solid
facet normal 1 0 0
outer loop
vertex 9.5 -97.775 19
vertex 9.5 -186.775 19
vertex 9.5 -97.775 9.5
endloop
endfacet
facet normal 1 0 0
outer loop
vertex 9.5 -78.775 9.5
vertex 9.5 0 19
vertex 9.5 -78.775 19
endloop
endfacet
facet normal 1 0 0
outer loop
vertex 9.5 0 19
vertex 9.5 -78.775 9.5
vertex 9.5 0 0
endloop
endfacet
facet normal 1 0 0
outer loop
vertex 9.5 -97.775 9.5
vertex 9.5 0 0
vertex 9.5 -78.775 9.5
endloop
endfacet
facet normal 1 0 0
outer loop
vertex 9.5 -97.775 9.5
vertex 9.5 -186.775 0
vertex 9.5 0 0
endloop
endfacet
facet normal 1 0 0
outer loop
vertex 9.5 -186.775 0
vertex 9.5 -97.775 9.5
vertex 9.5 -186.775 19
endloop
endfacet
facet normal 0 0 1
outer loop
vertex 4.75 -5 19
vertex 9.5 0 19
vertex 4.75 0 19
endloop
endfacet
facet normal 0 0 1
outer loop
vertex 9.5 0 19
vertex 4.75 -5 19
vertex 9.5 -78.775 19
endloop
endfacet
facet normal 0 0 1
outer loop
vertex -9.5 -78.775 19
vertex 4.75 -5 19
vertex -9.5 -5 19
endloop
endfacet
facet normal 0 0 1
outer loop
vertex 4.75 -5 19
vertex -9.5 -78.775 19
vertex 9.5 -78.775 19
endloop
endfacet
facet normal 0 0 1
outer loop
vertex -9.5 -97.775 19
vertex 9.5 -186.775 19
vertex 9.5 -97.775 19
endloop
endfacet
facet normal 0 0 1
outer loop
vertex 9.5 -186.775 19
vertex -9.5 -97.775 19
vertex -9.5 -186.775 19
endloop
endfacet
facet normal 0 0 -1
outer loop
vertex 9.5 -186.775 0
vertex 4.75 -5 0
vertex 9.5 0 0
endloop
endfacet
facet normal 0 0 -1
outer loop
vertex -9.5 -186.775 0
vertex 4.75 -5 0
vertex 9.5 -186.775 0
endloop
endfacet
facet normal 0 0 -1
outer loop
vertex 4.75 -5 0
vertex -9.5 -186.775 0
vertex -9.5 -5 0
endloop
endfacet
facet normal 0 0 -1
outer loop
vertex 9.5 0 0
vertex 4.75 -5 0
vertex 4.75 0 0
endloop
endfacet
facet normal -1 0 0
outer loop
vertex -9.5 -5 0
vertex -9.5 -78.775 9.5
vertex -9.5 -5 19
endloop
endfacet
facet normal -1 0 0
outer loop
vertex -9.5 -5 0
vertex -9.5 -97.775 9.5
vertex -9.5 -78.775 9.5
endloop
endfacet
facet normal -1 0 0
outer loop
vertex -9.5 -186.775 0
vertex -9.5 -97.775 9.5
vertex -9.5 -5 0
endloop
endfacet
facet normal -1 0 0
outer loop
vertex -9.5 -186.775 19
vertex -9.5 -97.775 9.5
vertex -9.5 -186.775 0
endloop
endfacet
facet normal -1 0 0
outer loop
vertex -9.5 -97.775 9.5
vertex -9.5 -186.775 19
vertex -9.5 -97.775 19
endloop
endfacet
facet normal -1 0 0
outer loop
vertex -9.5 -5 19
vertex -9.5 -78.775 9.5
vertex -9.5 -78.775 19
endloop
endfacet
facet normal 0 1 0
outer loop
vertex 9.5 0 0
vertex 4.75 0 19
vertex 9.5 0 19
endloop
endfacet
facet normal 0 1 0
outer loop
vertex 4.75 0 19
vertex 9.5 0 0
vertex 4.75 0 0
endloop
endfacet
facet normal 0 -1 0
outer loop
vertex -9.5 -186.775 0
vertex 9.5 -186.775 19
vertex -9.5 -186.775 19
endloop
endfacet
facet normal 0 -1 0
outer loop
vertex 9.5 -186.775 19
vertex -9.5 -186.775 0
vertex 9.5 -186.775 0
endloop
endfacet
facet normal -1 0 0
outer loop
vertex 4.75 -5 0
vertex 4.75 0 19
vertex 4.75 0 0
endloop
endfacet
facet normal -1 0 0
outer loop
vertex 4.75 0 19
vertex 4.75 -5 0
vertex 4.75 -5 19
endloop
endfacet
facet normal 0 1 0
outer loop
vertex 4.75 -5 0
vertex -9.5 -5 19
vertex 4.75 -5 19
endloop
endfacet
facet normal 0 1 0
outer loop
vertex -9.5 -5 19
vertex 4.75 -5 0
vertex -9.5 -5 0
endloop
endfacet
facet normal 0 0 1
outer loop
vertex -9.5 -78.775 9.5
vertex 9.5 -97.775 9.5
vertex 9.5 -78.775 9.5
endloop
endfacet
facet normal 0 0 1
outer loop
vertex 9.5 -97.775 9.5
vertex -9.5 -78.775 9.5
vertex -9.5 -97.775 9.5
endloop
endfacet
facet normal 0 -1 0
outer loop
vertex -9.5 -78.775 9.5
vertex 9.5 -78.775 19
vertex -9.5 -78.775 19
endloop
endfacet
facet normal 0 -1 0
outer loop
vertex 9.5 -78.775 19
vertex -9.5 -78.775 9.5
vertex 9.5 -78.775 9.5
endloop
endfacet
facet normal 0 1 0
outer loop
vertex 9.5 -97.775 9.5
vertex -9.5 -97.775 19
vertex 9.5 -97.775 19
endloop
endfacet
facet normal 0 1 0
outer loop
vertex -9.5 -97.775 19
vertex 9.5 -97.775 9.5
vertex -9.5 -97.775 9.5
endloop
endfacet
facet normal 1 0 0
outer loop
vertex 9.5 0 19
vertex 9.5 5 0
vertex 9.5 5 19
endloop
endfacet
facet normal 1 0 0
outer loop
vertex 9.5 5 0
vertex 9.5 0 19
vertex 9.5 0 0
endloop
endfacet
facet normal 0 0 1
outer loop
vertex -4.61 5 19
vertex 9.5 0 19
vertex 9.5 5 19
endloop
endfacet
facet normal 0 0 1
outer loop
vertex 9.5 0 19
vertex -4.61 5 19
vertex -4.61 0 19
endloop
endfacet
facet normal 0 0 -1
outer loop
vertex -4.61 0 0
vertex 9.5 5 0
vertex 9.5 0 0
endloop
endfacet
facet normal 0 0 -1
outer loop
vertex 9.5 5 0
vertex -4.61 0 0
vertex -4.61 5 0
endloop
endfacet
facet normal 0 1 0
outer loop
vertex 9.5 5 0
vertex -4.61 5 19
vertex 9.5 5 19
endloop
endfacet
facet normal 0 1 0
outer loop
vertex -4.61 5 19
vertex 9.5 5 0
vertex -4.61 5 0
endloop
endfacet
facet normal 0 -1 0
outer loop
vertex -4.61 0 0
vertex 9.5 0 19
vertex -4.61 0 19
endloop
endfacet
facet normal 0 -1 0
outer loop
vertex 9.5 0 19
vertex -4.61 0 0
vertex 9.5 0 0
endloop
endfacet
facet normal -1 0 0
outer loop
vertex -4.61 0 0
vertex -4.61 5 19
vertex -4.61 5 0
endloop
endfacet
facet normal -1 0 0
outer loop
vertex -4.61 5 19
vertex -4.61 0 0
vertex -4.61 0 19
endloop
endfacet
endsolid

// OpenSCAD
totalLength = 373.55;
thickness = 19;
lockWidth = 5;
lockOffset = 5;
lockWiggleRoom = 0.15;
smallOpeningSize = 19;
largeOpeningSize = 40.5;
smallOpeningOffsetFromEnd = 89;
largeOpeningOffsetFromEnd = 60.5;
printSmallPieceIf1AndLargePieceIf0 = 1;

if(printSmallPieceIf1AndLargePieceIf0 == 1)
{
    translate([thickness/-2,totalLength/-2,0])
    {
        union()
        {
            difference(){
                cube([thickness,totalLength/2,thickness]);  //main body
                translate([(lockWiggleRoom+0.01)*-1,totalLength/2-(lockWidth),-0.005])
                {
                    cube([(3*(thickness/4))+lockWiggleRoom+0.01,lockWidth+lockWiggleRoom,thickness+0.01]);
                }
                translate([-0.005,smallOpeningOffsetFromEnd,thickness/2])
                {
                    cube([thickness+0.01,smallOpeningSize,thickness/2+0.01]);
                }
            }
            translate([0,totalLength/2,0])
            {
                difference()
                {
                cube([thickness, lockOffset, thickness]);
                translate([-0.01,-0.01,-0.01])
                    {
                        cube([thickness/4+lockWiggleRoom,lockOffset+0.02,thickness+0.02]);
                    }
                }
            }
        }
    }
}
else
{
    rotate([0,0,180])
    {
    translate([thickness/-2,totalLength/-2,0])
    {
        union()
        {
            difference(){
                cube([thickness,totalLength/2,thickness]);
                translate([(lockWiggleRoom+0.01)*-1,totalLength/2-(lockWidth),-0.005])
                {
                    cube([(3*(thickness/4))+lockWiggleRoom+0.01,lockWidth+lockWiggleRoom,thickness+0.01]);
                    translate([0,lockWidth,0])
                    {
                        cube([thickness/4+lockWiggleRoom,lockOffset+0.01,thickness+0.01]);
                    }
                }
                translate([thickness/2,largeOpeningOffsetFromEnd,-0.005])
                {
                    cube([thickness/2+0.01,largeOpeningSize,thickness+0.01]);
                }
            }
            translate([0,totalLength/2,0])
            {
                difference()
                {
                cube([thickness, lockOffset, thickness]);
                translate([-0.01,-0.01,-0.01])
                    {
                        cube([thickness/4+lockWiggleRoom,lockOffset+0.02,thickness+0.02]);
                    }
                }
            }
        }
    }
    }
}
